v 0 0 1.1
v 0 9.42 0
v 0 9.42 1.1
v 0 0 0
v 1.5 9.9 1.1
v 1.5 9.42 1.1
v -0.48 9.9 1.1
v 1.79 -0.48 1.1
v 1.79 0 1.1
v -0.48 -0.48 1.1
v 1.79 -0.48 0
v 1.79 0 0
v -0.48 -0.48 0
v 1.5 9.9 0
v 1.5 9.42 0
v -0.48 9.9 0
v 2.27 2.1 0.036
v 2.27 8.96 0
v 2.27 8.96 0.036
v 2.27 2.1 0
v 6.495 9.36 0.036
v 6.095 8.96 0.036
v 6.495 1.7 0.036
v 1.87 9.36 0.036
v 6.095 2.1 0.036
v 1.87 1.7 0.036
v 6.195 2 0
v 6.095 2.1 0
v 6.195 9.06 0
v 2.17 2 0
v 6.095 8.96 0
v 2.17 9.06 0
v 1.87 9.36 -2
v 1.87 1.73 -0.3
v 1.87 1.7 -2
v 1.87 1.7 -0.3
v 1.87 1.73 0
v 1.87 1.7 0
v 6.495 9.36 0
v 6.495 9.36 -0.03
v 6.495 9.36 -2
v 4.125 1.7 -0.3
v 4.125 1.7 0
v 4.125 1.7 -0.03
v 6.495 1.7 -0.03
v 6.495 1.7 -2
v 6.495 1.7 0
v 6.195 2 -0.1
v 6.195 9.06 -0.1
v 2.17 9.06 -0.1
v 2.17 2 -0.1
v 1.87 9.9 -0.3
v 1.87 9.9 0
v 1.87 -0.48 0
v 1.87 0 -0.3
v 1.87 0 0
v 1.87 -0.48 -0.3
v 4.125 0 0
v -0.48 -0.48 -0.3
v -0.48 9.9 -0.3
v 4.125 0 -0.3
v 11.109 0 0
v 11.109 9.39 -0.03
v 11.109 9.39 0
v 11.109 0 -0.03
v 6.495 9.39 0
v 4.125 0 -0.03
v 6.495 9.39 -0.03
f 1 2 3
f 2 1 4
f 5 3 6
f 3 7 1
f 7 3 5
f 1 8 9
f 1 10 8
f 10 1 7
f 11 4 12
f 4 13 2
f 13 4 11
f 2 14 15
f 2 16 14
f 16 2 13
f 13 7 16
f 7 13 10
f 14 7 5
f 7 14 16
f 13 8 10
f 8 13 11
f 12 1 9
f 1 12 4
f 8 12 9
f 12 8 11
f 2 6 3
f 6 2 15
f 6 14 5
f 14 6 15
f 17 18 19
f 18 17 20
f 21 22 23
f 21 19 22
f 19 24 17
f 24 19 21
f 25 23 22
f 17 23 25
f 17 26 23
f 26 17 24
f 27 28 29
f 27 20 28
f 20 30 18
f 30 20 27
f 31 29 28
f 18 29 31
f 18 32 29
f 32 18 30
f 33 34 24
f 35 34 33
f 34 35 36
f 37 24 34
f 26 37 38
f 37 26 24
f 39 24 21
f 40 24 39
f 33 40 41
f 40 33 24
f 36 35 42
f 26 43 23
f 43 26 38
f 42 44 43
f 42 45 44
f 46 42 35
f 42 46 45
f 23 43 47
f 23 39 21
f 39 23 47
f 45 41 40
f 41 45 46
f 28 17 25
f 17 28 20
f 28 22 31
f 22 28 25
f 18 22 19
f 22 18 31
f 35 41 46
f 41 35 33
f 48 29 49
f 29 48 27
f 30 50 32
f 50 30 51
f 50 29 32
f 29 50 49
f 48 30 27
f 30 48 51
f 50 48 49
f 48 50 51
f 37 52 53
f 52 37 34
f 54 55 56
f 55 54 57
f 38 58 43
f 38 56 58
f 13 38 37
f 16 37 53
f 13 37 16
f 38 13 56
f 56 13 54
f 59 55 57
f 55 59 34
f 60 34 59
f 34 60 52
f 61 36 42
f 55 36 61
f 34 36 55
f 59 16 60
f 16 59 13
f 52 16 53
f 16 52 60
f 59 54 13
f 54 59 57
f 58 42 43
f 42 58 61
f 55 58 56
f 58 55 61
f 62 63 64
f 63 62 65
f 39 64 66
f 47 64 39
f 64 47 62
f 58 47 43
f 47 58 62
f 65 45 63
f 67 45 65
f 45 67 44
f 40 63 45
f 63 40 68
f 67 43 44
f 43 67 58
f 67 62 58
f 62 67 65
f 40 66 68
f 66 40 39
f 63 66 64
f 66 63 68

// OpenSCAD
// file: concrete_vars.scad
// The distance from the back wall, away from the house, to the end of the concrete by the giant umbrella
back_to_concrete = 4.125;
// The edge of the concrete by the gate to the start of the pool pavers
gate_edge_to_pool = 1.73;
// file: deck_vars.scad
include <concrete_vars.scad>
include <pool_vars.scad>
include <wall.scad>

// From the end of the concrete, going away from the house to the start of the white shed thing
concrete_to_shed = 4.084;
// From the house side of the shed, to the bricks on the ground past the end of the current deck
shed_to_bricks = 1.9; 
// How much further past the bricks we'll build
extra = 1;
concrete_to_new_end = concrete_to_shed + shed_to_bricks + extra;

// Extra deck (after the pool)
extra_deck_width = concrete_to_new_end + back_to_concrete - (back_to_pool + pool_width);

// Start of concrete to the edge of the pool, going away from the house
con_pool = back_to_pool + pool_width - back_to_concrete;

// how thick is a plank of wood
deck_thickness = 0.03;
// file: wall_vars.scad
wall_width = 0.48;
wall_height = 1.1;
inner_wall_length = 9.42;
// file: pool_vars.scad
// Pool size
pool_width = 4.625;
pool_length = 7.66;
pool_depth = 2; // I just made this up

// Paver vars
paver_width = 0.4;
paver_height = 0.036;

water_top = -0.1;     // TODO: I just made this up too
concrete_thickness = 0.3; // I just made this up

// Inner wall to edge of pavers from the back
back_to_pool = 1.87;
// file: deck.scad
include <deck_vars.scad>

module deck() {
  // Gate side
	cube([concrete_to_new_end, gate_edge_to_pool, deck_thickness]);
	// Far side
	translate([con_pool, gate_edge_to_pool, 0])
		cube([extra_deck_width, pool_length, deck_thickness]);
}
// file: concrete.scad
include <wall_vars.scad>
include <pool_vars.scad>
include <concrete_vars.scad>

module concrete() {
	translate([0, 0, -concrete_thickness]) {
	  color("gray")
		  union() {
				cube([back_to_pool + wall_width, inner_wall_length + wall_width * 2, concrete_thickness]);
				translate([wall_width, wall_width, 0])
					cube([back_to_concrete, gate_edge_to_pool, concrete_thickness]);
			}
	}
}
// file: wall.scad
include <wall_vars.scad>

module wall(length) {
	  cube([wall_width, length, wall_height]);
}

module back_wall() {
  union() {
		// back wall
		back_length = inner_wall_length + wall_width * 2;
		wall(back_length);

		// Right wall (gate side)
	  translate([wall_width, wall_width, 0])
			rotate([0,0,-90])
				wall(1.790);

		// Left wall (shower side)
		translate([wall_width,back_length,0])
			rotate([0,0,-90])
			  wall(1.5);
	}
}
// file: pool.scad
include <pool_vars.scad>

module pool() {
  color("wheat")
		pavers();

	pool_size = [pool_width, pool_length, pool_depth];
	// Underground
	translate([0, 0, -pool_depth]) {
	  // Concrete
		inner_cube = pool_size - [concrete_thickness * 2, concrete_thickness * 2, 00];
		color("aqua")
			difference() {
				  // outer_cube
					cube(pool_size);
					// Inner cube
					translate([concrete_thickness, concrete_thickness, 0.001])
					  cube(inner_cube); 
				}
			// Water
			water = inner_cube - [0,0,-water_top];
			color([0.8,0.9,1,0.9])
					translate([concrete_thickness, concrete_thickness, 0])
					  cube(water); 
	}
}

module water() {
	
}

module pavers() {
	// House side
	cube([paver_width, pool_length, paver_height]);
	// Gate side
	cube([pool_width, paver_width, paver_height]);
	// Garden side
	translate([pool_width - paver_width,0,0])
	 cube([paver_width, pool_length, paver_height]);
	translate([0,pool_length - paver_width,0])
	 cube([pool_width, paver_width, paver_height]);
}
// main file
use <pool.scad>
use <wall.scad>
use <concrete.scad>
use <deck.scad>

include <pool_vars.scad>
include <wall_vars.scad>
include <deck_vars.scad>
include <concrete_vars.scad>

translate([-wall_width, -wall_width, 0])
	back_wall();

translate([back_to_pool, 1.70, 0])
	pool();

translate([-wall_width, -wall_width, 0])
	concrete();

color("DarkKhaki")
	translate([back_to_concrete, 0, -deck_thickness])
	  deck();
